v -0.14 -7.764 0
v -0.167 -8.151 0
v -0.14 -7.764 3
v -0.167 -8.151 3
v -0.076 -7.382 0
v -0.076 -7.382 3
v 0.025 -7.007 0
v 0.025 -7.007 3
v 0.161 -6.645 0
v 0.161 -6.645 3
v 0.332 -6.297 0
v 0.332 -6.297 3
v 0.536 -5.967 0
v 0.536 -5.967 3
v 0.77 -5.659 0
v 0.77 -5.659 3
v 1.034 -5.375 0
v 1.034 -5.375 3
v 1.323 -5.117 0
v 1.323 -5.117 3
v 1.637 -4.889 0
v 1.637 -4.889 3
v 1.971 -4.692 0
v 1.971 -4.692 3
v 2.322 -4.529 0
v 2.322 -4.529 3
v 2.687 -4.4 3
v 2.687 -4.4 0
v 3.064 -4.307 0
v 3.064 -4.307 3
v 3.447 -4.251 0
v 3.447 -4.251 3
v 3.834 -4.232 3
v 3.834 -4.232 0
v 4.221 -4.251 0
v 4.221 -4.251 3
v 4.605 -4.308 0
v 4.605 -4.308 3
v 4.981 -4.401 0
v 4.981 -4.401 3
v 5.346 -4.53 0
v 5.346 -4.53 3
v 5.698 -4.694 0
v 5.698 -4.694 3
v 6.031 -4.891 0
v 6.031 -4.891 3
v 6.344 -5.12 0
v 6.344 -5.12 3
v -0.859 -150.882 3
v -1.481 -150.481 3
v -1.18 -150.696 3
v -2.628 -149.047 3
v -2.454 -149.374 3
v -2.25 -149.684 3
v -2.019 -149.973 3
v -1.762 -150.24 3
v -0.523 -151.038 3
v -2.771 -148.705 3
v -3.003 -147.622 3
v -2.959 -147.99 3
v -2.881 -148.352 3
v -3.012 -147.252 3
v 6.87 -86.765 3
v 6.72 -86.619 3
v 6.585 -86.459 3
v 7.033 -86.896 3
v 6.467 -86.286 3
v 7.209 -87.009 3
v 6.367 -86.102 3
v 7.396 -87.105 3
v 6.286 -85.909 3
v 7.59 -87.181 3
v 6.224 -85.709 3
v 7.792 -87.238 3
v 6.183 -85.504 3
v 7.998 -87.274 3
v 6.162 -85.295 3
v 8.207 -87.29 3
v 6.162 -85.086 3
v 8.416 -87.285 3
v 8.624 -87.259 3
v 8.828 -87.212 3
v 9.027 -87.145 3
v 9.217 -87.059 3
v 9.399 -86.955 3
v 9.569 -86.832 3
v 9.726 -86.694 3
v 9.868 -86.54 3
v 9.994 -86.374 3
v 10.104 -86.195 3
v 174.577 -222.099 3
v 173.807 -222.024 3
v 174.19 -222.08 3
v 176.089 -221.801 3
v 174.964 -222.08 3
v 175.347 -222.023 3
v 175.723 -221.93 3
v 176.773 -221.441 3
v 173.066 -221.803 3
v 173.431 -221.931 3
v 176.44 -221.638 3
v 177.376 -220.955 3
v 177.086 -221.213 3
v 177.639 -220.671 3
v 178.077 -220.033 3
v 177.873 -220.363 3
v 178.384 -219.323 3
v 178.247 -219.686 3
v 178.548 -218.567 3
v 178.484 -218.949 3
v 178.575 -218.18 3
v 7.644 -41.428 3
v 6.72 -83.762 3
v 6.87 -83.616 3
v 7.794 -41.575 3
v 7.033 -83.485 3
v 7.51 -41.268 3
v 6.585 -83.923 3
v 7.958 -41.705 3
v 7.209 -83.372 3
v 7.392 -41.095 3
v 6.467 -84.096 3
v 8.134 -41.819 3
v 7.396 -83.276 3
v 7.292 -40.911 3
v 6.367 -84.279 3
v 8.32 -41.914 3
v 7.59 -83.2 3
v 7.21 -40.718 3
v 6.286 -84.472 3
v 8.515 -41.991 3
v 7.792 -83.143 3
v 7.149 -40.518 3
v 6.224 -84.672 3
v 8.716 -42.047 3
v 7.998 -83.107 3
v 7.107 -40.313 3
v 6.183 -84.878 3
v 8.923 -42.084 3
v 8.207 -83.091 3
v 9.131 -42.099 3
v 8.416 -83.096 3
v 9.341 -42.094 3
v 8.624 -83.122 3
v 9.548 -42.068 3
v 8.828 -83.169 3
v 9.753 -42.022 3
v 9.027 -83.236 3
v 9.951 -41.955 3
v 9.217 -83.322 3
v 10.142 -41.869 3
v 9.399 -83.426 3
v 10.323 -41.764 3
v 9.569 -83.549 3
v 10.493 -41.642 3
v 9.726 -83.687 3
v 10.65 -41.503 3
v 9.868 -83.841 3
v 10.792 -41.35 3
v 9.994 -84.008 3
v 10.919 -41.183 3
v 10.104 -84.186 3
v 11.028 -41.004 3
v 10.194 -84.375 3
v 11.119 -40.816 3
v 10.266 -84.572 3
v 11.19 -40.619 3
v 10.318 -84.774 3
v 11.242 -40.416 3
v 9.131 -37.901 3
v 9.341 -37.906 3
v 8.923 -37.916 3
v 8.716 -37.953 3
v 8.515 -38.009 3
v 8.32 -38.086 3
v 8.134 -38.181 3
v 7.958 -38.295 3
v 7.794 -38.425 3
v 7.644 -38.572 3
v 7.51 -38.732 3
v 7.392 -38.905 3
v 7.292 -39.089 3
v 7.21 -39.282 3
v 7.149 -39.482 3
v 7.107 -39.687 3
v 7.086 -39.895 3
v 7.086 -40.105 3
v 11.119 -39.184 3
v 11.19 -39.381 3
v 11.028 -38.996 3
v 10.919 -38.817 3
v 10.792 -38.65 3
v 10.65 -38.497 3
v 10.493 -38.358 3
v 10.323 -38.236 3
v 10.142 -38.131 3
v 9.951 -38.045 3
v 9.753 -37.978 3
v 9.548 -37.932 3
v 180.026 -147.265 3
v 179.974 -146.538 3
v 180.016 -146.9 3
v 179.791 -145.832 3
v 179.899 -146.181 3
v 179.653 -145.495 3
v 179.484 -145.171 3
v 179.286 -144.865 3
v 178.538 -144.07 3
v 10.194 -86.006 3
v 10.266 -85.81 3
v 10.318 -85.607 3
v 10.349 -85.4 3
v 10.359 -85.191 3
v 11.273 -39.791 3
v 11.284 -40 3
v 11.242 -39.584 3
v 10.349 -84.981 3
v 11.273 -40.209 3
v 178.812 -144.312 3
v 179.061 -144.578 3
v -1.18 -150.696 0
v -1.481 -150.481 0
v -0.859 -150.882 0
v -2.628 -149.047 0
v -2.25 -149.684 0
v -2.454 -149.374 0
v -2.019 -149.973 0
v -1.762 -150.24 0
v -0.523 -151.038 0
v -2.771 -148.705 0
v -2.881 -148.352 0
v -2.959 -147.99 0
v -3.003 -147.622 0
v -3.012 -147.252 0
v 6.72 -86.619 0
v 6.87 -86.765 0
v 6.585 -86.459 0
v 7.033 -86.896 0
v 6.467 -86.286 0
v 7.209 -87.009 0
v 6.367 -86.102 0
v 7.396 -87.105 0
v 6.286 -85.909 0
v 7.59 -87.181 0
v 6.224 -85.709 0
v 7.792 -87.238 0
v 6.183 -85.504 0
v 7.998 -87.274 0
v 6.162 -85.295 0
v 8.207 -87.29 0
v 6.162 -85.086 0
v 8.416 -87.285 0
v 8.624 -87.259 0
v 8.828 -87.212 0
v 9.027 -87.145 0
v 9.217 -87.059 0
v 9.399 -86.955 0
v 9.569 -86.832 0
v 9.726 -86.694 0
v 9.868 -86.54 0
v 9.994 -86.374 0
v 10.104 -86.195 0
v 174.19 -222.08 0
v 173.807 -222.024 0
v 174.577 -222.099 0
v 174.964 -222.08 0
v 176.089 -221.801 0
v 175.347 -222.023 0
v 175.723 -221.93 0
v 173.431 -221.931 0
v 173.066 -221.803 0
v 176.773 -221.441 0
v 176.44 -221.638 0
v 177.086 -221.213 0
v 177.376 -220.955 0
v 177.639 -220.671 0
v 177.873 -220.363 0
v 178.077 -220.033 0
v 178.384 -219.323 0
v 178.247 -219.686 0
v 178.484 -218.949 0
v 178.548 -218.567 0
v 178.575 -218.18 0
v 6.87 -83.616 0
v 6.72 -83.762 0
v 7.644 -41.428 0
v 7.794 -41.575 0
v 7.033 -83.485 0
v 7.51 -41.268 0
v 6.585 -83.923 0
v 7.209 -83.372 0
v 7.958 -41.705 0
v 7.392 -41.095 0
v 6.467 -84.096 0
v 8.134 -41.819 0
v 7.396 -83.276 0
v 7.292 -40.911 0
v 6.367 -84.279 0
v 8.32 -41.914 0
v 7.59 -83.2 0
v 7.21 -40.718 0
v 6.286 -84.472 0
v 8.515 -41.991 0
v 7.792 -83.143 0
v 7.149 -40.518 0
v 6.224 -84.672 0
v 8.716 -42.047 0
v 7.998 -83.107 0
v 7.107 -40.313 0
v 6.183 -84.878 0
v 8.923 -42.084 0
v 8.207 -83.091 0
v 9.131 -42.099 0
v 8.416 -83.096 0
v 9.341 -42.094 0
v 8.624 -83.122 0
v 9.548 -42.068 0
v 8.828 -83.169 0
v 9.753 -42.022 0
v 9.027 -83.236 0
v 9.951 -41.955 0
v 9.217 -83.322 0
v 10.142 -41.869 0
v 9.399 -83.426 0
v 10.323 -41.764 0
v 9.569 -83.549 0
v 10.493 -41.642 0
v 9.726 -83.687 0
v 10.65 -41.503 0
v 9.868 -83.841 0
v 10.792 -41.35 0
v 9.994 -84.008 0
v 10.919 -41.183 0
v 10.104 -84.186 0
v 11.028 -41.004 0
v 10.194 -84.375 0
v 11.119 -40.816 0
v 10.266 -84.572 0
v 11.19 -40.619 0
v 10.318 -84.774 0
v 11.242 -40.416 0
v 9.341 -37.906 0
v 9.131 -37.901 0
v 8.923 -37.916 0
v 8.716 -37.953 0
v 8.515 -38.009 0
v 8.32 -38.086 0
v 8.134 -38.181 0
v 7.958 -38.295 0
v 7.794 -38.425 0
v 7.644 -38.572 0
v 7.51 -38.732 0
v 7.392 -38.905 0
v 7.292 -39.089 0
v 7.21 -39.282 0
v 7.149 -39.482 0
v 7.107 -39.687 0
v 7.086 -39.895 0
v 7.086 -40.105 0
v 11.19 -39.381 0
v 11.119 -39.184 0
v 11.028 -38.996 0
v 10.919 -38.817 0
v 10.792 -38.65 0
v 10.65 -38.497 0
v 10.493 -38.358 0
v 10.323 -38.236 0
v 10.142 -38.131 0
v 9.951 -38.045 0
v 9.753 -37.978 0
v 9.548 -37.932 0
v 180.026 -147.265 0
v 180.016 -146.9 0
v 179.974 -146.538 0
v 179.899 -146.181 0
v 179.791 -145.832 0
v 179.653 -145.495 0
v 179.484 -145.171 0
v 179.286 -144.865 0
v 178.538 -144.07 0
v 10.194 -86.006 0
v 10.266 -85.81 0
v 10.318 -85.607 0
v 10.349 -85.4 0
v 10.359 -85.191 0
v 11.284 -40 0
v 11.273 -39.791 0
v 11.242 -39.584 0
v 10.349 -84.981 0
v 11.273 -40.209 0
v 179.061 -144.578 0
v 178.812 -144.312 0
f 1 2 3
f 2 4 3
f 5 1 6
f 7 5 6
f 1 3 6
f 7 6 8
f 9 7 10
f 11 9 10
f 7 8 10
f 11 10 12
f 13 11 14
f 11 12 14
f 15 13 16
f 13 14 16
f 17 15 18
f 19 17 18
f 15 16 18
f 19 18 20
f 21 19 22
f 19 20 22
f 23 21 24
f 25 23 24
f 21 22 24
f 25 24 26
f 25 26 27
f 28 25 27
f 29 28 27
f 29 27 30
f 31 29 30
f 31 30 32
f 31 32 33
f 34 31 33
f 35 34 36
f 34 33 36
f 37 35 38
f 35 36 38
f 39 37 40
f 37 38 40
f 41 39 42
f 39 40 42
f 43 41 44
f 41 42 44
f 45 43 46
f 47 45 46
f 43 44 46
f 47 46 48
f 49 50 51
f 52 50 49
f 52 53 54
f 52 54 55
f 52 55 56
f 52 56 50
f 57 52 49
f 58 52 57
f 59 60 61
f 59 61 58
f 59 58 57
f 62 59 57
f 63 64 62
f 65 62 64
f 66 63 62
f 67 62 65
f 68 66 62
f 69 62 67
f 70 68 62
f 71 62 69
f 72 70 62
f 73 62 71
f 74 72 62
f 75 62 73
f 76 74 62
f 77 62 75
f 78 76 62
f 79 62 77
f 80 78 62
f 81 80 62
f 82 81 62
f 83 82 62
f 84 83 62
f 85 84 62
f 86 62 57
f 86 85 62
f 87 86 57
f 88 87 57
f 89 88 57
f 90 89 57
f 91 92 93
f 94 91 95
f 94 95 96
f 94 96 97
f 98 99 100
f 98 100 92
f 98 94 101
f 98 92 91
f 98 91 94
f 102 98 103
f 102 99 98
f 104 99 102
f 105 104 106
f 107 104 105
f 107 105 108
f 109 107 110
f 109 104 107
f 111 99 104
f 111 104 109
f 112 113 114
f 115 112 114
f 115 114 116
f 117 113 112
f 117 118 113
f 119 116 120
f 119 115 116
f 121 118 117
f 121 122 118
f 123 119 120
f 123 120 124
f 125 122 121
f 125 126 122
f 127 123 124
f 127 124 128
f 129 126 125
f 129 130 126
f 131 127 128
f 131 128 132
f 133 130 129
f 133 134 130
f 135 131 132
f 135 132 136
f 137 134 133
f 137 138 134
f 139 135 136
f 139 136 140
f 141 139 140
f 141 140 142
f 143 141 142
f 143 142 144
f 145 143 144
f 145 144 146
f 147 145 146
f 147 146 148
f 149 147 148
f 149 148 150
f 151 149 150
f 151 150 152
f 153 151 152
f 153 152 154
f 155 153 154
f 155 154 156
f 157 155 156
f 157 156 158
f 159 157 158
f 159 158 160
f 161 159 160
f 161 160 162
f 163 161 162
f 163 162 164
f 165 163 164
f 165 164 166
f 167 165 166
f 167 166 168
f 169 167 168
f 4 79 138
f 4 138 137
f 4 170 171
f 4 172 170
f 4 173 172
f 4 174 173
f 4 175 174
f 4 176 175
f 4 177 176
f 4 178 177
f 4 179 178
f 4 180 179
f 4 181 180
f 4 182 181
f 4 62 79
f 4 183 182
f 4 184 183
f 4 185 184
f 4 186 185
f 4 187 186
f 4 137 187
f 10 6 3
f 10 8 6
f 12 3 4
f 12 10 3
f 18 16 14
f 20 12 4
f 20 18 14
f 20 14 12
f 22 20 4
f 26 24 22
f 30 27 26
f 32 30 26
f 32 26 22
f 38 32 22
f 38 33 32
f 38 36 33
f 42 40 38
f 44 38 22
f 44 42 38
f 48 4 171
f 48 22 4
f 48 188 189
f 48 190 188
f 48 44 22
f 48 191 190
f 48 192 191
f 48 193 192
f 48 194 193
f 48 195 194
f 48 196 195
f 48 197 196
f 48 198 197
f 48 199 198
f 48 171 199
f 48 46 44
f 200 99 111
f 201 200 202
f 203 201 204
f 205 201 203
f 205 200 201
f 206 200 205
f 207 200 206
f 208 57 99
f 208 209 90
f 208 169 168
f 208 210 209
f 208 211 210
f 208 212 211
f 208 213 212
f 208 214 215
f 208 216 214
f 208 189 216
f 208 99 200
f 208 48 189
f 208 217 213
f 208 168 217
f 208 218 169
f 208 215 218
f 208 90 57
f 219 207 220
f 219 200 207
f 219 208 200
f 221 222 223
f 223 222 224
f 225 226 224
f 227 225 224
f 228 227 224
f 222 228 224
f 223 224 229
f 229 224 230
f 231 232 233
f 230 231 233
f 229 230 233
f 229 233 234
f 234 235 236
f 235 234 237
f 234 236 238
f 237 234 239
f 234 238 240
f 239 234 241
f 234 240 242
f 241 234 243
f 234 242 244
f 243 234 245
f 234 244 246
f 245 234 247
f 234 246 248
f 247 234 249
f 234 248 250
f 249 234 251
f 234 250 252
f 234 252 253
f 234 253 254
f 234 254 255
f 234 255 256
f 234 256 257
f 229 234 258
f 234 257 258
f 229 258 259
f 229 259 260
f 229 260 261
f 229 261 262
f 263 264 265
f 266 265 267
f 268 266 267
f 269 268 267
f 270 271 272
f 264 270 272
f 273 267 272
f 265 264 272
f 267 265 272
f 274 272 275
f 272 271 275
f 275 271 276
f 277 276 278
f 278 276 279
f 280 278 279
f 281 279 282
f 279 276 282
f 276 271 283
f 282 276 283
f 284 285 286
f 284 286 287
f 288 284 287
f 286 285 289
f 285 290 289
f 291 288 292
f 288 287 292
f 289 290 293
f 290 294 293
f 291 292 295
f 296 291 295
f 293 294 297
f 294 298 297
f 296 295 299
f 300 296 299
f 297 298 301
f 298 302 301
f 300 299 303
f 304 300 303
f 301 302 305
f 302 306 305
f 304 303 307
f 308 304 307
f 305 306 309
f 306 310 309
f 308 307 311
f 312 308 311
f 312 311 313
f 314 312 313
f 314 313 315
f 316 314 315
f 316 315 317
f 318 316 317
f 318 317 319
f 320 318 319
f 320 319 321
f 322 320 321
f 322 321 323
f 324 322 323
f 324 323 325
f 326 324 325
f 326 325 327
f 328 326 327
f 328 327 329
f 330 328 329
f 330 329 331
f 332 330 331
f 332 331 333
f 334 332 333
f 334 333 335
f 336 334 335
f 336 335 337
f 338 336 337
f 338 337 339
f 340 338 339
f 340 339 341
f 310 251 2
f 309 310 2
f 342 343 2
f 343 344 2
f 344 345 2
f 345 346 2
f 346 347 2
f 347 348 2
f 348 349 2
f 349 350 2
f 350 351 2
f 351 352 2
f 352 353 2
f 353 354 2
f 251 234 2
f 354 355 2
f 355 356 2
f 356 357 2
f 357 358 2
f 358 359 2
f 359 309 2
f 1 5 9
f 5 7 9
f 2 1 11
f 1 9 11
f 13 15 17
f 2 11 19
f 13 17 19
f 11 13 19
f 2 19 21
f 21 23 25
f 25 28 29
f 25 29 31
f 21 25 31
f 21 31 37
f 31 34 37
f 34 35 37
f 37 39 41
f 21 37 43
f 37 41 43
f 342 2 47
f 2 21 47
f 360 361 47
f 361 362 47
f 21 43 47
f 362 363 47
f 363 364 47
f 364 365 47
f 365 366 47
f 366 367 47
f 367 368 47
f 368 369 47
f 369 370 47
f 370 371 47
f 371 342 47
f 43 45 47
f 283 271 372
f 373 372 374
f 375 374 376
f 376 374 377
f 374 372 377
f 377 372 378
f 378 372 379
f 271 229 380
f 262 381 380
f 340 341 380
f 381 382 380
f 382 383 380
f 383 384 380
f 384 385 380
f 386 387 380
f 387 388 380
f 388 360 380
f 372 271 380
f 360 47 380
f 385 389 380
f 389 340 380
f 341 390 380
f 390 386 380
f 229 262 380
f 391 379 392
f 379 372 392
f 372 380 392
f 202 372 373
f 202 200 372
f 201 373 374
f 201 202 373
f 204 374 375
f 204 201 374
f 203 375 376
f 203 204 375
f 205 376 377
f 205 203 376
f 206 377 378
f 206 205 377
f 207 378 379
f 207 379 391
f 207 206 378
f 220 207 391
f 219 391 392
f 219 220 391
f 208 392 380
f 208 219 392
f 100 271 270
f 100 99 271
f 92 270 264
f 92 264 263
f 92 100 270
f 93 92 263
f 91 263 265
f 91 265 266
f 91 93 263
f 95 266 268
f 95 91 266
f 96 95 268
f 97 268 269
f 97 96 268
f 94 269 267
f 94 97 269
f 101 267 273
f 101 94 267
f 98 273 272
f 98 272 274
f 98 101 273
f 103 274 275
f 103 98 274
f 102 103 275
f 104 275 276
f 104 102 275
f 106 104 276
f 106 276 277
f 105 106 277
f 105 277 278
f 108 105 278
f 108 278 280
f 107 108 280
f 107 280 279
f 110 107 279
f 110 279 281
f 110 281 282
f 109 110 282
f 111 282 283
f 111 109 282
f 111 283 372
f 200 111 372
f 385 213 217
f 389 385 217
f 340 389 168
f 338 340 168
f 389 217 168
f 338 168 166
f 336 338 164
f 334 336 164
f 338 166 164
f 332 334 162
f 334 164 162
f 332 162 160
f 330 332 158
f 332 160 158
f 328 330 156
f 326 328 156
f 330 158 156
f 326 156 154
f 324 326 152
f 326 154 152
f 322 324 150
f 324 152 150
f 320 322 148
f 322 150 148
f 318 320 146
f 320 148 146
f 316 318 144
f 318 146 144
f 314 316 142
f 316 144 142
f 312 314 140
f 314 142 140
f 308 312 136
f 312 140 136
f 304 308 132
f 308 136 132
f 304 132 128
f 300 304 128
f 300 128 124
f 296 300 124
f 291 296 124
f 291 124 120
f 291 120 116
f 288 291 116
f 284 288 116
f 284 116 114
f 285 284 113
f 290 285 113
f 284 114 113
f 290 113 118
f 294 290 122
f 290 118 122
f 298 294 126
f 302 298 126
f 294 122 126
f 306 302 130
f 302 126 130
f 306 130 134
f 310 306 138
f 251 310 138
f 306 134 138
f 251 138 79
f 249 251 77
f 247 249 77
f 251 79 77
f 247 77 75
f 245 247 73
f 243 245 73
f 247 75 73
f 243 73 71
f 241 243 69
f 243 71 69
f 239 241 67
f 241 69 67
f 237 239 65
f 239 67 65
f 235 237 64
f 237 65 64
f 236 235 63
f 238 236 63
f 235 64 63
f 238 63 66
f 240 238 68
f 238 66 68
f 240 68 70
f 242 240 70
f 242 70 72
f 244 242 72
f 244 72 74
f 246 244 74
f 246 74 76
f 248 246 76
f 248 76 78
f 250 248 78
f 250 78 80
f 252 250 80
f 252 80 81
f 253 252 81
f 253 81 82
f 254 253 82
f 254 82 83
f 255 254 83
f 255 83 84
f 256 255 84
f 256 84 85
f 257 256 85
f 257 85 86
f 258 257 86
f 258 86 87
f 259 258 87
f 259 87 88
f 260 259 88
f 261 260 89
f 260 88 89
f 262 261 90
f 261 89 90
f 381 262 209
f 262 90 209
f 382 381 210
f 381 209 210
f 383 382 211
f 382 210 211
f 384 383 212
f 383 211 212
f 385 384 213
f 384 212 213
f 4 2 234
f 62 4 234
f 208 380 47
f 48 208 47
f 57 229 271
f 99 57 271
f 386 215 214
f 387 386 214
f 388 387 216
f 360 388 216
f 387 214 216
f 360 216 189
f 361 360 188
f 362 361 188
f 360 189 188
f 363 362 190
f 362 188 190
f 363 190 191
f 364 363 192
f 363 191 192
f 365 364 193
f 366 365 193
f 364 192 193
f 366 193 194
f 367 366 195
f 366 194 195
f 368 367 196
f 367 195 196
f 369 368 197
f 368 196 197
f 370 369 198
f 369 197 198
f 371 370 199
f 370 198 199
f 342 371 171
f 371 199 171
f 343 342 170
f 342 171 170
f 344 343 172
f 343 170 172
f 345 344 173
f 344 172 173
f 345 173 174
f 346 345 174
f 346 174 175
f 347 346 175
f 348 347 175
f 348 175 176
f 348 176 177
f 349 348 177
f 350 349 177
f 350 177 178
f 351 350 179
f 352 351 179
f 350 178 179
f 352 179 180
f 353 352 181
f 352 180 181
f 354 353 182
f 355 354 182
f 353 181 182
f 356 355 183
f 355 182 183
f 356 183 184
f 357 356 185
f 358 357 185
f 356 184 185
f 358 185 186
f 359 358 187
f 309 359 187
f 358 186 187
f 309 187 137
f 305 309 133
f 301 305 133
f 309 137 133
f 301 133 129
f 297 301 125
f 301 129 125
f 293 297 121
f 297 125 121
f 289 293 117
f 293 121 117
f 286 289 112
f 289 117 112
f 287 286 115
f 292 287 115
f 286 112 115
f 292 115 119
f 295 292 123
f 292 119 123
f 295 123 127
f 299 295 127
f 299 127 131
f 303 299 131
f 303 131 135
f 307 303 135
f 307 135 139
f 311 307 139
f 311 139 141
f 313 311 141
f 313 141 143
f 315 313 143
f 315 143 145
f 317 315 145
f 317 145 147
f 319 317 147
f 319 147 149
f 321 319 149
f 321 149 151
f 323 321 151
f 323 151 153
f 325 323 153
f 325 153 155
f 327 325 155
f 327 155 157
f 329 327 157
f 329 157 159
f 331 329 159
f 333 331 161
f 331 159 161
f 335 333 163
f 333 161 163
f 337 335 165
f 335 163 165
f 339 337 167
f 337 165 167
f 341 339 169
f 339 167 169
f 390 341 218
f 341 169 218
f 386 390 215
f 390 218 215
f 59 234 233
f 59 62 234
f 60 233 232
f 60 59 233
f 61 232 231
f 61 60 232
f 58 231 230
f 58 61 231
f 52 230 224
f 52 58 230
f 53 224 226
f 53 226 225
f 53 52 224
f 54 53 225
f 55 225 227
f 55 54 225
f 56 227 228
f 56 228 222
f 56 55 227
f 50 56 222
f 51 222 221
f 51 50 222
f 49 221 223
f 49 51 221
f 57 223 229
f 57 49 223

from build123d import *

# Parameters (mm, degrees)
EXTRUDE_1_DEPTH     = 3
FILLET_1_R          = 4
SKETCH_2_R          = 2.1
CUT_EXTRUDE_1_DEPTH = 3


with BuildPart() as part:
    # Эскиз1 → Бобышка-Вытянуть1 (new body)
    with BuildSketch(Plane.XY):
        Polygon((0, 0), (-3.068659699, -150), (178.455758645, -224), (180.065729767, -145.302558134), align=None)
    extrude(amount=EXTRUDE_1_DEPTH)

    # Скругление1
    fillet_1_edges = [part.edges().sort_by_distance(p)[0] for p in [
        (178.455758645, -224, 1.5),
        (-3.068659699, -150, 1.5),
        (0, 0, 1.5),
        (180.065729767, -145.302558134, 1.5),
    ]]
    fillet(fillet_1_edges, radius=FILLET_1_R)

    # Эскиз2 → Вырез-Вытянуть1 (cut)
    with BuildSketch(Plane.XY.offset(3)):
        with Locations((9.183783122, -40)):
            Circle(SKETCH_2_R)
        with Locations((8.259287105, -85.190544444)):
            Circle(SKETCH_2_R)
    extrude(amount=-CUT_EXTRUDE_1_DEPTH, mode=Mode.SUBTRACT)


solid = part.part
